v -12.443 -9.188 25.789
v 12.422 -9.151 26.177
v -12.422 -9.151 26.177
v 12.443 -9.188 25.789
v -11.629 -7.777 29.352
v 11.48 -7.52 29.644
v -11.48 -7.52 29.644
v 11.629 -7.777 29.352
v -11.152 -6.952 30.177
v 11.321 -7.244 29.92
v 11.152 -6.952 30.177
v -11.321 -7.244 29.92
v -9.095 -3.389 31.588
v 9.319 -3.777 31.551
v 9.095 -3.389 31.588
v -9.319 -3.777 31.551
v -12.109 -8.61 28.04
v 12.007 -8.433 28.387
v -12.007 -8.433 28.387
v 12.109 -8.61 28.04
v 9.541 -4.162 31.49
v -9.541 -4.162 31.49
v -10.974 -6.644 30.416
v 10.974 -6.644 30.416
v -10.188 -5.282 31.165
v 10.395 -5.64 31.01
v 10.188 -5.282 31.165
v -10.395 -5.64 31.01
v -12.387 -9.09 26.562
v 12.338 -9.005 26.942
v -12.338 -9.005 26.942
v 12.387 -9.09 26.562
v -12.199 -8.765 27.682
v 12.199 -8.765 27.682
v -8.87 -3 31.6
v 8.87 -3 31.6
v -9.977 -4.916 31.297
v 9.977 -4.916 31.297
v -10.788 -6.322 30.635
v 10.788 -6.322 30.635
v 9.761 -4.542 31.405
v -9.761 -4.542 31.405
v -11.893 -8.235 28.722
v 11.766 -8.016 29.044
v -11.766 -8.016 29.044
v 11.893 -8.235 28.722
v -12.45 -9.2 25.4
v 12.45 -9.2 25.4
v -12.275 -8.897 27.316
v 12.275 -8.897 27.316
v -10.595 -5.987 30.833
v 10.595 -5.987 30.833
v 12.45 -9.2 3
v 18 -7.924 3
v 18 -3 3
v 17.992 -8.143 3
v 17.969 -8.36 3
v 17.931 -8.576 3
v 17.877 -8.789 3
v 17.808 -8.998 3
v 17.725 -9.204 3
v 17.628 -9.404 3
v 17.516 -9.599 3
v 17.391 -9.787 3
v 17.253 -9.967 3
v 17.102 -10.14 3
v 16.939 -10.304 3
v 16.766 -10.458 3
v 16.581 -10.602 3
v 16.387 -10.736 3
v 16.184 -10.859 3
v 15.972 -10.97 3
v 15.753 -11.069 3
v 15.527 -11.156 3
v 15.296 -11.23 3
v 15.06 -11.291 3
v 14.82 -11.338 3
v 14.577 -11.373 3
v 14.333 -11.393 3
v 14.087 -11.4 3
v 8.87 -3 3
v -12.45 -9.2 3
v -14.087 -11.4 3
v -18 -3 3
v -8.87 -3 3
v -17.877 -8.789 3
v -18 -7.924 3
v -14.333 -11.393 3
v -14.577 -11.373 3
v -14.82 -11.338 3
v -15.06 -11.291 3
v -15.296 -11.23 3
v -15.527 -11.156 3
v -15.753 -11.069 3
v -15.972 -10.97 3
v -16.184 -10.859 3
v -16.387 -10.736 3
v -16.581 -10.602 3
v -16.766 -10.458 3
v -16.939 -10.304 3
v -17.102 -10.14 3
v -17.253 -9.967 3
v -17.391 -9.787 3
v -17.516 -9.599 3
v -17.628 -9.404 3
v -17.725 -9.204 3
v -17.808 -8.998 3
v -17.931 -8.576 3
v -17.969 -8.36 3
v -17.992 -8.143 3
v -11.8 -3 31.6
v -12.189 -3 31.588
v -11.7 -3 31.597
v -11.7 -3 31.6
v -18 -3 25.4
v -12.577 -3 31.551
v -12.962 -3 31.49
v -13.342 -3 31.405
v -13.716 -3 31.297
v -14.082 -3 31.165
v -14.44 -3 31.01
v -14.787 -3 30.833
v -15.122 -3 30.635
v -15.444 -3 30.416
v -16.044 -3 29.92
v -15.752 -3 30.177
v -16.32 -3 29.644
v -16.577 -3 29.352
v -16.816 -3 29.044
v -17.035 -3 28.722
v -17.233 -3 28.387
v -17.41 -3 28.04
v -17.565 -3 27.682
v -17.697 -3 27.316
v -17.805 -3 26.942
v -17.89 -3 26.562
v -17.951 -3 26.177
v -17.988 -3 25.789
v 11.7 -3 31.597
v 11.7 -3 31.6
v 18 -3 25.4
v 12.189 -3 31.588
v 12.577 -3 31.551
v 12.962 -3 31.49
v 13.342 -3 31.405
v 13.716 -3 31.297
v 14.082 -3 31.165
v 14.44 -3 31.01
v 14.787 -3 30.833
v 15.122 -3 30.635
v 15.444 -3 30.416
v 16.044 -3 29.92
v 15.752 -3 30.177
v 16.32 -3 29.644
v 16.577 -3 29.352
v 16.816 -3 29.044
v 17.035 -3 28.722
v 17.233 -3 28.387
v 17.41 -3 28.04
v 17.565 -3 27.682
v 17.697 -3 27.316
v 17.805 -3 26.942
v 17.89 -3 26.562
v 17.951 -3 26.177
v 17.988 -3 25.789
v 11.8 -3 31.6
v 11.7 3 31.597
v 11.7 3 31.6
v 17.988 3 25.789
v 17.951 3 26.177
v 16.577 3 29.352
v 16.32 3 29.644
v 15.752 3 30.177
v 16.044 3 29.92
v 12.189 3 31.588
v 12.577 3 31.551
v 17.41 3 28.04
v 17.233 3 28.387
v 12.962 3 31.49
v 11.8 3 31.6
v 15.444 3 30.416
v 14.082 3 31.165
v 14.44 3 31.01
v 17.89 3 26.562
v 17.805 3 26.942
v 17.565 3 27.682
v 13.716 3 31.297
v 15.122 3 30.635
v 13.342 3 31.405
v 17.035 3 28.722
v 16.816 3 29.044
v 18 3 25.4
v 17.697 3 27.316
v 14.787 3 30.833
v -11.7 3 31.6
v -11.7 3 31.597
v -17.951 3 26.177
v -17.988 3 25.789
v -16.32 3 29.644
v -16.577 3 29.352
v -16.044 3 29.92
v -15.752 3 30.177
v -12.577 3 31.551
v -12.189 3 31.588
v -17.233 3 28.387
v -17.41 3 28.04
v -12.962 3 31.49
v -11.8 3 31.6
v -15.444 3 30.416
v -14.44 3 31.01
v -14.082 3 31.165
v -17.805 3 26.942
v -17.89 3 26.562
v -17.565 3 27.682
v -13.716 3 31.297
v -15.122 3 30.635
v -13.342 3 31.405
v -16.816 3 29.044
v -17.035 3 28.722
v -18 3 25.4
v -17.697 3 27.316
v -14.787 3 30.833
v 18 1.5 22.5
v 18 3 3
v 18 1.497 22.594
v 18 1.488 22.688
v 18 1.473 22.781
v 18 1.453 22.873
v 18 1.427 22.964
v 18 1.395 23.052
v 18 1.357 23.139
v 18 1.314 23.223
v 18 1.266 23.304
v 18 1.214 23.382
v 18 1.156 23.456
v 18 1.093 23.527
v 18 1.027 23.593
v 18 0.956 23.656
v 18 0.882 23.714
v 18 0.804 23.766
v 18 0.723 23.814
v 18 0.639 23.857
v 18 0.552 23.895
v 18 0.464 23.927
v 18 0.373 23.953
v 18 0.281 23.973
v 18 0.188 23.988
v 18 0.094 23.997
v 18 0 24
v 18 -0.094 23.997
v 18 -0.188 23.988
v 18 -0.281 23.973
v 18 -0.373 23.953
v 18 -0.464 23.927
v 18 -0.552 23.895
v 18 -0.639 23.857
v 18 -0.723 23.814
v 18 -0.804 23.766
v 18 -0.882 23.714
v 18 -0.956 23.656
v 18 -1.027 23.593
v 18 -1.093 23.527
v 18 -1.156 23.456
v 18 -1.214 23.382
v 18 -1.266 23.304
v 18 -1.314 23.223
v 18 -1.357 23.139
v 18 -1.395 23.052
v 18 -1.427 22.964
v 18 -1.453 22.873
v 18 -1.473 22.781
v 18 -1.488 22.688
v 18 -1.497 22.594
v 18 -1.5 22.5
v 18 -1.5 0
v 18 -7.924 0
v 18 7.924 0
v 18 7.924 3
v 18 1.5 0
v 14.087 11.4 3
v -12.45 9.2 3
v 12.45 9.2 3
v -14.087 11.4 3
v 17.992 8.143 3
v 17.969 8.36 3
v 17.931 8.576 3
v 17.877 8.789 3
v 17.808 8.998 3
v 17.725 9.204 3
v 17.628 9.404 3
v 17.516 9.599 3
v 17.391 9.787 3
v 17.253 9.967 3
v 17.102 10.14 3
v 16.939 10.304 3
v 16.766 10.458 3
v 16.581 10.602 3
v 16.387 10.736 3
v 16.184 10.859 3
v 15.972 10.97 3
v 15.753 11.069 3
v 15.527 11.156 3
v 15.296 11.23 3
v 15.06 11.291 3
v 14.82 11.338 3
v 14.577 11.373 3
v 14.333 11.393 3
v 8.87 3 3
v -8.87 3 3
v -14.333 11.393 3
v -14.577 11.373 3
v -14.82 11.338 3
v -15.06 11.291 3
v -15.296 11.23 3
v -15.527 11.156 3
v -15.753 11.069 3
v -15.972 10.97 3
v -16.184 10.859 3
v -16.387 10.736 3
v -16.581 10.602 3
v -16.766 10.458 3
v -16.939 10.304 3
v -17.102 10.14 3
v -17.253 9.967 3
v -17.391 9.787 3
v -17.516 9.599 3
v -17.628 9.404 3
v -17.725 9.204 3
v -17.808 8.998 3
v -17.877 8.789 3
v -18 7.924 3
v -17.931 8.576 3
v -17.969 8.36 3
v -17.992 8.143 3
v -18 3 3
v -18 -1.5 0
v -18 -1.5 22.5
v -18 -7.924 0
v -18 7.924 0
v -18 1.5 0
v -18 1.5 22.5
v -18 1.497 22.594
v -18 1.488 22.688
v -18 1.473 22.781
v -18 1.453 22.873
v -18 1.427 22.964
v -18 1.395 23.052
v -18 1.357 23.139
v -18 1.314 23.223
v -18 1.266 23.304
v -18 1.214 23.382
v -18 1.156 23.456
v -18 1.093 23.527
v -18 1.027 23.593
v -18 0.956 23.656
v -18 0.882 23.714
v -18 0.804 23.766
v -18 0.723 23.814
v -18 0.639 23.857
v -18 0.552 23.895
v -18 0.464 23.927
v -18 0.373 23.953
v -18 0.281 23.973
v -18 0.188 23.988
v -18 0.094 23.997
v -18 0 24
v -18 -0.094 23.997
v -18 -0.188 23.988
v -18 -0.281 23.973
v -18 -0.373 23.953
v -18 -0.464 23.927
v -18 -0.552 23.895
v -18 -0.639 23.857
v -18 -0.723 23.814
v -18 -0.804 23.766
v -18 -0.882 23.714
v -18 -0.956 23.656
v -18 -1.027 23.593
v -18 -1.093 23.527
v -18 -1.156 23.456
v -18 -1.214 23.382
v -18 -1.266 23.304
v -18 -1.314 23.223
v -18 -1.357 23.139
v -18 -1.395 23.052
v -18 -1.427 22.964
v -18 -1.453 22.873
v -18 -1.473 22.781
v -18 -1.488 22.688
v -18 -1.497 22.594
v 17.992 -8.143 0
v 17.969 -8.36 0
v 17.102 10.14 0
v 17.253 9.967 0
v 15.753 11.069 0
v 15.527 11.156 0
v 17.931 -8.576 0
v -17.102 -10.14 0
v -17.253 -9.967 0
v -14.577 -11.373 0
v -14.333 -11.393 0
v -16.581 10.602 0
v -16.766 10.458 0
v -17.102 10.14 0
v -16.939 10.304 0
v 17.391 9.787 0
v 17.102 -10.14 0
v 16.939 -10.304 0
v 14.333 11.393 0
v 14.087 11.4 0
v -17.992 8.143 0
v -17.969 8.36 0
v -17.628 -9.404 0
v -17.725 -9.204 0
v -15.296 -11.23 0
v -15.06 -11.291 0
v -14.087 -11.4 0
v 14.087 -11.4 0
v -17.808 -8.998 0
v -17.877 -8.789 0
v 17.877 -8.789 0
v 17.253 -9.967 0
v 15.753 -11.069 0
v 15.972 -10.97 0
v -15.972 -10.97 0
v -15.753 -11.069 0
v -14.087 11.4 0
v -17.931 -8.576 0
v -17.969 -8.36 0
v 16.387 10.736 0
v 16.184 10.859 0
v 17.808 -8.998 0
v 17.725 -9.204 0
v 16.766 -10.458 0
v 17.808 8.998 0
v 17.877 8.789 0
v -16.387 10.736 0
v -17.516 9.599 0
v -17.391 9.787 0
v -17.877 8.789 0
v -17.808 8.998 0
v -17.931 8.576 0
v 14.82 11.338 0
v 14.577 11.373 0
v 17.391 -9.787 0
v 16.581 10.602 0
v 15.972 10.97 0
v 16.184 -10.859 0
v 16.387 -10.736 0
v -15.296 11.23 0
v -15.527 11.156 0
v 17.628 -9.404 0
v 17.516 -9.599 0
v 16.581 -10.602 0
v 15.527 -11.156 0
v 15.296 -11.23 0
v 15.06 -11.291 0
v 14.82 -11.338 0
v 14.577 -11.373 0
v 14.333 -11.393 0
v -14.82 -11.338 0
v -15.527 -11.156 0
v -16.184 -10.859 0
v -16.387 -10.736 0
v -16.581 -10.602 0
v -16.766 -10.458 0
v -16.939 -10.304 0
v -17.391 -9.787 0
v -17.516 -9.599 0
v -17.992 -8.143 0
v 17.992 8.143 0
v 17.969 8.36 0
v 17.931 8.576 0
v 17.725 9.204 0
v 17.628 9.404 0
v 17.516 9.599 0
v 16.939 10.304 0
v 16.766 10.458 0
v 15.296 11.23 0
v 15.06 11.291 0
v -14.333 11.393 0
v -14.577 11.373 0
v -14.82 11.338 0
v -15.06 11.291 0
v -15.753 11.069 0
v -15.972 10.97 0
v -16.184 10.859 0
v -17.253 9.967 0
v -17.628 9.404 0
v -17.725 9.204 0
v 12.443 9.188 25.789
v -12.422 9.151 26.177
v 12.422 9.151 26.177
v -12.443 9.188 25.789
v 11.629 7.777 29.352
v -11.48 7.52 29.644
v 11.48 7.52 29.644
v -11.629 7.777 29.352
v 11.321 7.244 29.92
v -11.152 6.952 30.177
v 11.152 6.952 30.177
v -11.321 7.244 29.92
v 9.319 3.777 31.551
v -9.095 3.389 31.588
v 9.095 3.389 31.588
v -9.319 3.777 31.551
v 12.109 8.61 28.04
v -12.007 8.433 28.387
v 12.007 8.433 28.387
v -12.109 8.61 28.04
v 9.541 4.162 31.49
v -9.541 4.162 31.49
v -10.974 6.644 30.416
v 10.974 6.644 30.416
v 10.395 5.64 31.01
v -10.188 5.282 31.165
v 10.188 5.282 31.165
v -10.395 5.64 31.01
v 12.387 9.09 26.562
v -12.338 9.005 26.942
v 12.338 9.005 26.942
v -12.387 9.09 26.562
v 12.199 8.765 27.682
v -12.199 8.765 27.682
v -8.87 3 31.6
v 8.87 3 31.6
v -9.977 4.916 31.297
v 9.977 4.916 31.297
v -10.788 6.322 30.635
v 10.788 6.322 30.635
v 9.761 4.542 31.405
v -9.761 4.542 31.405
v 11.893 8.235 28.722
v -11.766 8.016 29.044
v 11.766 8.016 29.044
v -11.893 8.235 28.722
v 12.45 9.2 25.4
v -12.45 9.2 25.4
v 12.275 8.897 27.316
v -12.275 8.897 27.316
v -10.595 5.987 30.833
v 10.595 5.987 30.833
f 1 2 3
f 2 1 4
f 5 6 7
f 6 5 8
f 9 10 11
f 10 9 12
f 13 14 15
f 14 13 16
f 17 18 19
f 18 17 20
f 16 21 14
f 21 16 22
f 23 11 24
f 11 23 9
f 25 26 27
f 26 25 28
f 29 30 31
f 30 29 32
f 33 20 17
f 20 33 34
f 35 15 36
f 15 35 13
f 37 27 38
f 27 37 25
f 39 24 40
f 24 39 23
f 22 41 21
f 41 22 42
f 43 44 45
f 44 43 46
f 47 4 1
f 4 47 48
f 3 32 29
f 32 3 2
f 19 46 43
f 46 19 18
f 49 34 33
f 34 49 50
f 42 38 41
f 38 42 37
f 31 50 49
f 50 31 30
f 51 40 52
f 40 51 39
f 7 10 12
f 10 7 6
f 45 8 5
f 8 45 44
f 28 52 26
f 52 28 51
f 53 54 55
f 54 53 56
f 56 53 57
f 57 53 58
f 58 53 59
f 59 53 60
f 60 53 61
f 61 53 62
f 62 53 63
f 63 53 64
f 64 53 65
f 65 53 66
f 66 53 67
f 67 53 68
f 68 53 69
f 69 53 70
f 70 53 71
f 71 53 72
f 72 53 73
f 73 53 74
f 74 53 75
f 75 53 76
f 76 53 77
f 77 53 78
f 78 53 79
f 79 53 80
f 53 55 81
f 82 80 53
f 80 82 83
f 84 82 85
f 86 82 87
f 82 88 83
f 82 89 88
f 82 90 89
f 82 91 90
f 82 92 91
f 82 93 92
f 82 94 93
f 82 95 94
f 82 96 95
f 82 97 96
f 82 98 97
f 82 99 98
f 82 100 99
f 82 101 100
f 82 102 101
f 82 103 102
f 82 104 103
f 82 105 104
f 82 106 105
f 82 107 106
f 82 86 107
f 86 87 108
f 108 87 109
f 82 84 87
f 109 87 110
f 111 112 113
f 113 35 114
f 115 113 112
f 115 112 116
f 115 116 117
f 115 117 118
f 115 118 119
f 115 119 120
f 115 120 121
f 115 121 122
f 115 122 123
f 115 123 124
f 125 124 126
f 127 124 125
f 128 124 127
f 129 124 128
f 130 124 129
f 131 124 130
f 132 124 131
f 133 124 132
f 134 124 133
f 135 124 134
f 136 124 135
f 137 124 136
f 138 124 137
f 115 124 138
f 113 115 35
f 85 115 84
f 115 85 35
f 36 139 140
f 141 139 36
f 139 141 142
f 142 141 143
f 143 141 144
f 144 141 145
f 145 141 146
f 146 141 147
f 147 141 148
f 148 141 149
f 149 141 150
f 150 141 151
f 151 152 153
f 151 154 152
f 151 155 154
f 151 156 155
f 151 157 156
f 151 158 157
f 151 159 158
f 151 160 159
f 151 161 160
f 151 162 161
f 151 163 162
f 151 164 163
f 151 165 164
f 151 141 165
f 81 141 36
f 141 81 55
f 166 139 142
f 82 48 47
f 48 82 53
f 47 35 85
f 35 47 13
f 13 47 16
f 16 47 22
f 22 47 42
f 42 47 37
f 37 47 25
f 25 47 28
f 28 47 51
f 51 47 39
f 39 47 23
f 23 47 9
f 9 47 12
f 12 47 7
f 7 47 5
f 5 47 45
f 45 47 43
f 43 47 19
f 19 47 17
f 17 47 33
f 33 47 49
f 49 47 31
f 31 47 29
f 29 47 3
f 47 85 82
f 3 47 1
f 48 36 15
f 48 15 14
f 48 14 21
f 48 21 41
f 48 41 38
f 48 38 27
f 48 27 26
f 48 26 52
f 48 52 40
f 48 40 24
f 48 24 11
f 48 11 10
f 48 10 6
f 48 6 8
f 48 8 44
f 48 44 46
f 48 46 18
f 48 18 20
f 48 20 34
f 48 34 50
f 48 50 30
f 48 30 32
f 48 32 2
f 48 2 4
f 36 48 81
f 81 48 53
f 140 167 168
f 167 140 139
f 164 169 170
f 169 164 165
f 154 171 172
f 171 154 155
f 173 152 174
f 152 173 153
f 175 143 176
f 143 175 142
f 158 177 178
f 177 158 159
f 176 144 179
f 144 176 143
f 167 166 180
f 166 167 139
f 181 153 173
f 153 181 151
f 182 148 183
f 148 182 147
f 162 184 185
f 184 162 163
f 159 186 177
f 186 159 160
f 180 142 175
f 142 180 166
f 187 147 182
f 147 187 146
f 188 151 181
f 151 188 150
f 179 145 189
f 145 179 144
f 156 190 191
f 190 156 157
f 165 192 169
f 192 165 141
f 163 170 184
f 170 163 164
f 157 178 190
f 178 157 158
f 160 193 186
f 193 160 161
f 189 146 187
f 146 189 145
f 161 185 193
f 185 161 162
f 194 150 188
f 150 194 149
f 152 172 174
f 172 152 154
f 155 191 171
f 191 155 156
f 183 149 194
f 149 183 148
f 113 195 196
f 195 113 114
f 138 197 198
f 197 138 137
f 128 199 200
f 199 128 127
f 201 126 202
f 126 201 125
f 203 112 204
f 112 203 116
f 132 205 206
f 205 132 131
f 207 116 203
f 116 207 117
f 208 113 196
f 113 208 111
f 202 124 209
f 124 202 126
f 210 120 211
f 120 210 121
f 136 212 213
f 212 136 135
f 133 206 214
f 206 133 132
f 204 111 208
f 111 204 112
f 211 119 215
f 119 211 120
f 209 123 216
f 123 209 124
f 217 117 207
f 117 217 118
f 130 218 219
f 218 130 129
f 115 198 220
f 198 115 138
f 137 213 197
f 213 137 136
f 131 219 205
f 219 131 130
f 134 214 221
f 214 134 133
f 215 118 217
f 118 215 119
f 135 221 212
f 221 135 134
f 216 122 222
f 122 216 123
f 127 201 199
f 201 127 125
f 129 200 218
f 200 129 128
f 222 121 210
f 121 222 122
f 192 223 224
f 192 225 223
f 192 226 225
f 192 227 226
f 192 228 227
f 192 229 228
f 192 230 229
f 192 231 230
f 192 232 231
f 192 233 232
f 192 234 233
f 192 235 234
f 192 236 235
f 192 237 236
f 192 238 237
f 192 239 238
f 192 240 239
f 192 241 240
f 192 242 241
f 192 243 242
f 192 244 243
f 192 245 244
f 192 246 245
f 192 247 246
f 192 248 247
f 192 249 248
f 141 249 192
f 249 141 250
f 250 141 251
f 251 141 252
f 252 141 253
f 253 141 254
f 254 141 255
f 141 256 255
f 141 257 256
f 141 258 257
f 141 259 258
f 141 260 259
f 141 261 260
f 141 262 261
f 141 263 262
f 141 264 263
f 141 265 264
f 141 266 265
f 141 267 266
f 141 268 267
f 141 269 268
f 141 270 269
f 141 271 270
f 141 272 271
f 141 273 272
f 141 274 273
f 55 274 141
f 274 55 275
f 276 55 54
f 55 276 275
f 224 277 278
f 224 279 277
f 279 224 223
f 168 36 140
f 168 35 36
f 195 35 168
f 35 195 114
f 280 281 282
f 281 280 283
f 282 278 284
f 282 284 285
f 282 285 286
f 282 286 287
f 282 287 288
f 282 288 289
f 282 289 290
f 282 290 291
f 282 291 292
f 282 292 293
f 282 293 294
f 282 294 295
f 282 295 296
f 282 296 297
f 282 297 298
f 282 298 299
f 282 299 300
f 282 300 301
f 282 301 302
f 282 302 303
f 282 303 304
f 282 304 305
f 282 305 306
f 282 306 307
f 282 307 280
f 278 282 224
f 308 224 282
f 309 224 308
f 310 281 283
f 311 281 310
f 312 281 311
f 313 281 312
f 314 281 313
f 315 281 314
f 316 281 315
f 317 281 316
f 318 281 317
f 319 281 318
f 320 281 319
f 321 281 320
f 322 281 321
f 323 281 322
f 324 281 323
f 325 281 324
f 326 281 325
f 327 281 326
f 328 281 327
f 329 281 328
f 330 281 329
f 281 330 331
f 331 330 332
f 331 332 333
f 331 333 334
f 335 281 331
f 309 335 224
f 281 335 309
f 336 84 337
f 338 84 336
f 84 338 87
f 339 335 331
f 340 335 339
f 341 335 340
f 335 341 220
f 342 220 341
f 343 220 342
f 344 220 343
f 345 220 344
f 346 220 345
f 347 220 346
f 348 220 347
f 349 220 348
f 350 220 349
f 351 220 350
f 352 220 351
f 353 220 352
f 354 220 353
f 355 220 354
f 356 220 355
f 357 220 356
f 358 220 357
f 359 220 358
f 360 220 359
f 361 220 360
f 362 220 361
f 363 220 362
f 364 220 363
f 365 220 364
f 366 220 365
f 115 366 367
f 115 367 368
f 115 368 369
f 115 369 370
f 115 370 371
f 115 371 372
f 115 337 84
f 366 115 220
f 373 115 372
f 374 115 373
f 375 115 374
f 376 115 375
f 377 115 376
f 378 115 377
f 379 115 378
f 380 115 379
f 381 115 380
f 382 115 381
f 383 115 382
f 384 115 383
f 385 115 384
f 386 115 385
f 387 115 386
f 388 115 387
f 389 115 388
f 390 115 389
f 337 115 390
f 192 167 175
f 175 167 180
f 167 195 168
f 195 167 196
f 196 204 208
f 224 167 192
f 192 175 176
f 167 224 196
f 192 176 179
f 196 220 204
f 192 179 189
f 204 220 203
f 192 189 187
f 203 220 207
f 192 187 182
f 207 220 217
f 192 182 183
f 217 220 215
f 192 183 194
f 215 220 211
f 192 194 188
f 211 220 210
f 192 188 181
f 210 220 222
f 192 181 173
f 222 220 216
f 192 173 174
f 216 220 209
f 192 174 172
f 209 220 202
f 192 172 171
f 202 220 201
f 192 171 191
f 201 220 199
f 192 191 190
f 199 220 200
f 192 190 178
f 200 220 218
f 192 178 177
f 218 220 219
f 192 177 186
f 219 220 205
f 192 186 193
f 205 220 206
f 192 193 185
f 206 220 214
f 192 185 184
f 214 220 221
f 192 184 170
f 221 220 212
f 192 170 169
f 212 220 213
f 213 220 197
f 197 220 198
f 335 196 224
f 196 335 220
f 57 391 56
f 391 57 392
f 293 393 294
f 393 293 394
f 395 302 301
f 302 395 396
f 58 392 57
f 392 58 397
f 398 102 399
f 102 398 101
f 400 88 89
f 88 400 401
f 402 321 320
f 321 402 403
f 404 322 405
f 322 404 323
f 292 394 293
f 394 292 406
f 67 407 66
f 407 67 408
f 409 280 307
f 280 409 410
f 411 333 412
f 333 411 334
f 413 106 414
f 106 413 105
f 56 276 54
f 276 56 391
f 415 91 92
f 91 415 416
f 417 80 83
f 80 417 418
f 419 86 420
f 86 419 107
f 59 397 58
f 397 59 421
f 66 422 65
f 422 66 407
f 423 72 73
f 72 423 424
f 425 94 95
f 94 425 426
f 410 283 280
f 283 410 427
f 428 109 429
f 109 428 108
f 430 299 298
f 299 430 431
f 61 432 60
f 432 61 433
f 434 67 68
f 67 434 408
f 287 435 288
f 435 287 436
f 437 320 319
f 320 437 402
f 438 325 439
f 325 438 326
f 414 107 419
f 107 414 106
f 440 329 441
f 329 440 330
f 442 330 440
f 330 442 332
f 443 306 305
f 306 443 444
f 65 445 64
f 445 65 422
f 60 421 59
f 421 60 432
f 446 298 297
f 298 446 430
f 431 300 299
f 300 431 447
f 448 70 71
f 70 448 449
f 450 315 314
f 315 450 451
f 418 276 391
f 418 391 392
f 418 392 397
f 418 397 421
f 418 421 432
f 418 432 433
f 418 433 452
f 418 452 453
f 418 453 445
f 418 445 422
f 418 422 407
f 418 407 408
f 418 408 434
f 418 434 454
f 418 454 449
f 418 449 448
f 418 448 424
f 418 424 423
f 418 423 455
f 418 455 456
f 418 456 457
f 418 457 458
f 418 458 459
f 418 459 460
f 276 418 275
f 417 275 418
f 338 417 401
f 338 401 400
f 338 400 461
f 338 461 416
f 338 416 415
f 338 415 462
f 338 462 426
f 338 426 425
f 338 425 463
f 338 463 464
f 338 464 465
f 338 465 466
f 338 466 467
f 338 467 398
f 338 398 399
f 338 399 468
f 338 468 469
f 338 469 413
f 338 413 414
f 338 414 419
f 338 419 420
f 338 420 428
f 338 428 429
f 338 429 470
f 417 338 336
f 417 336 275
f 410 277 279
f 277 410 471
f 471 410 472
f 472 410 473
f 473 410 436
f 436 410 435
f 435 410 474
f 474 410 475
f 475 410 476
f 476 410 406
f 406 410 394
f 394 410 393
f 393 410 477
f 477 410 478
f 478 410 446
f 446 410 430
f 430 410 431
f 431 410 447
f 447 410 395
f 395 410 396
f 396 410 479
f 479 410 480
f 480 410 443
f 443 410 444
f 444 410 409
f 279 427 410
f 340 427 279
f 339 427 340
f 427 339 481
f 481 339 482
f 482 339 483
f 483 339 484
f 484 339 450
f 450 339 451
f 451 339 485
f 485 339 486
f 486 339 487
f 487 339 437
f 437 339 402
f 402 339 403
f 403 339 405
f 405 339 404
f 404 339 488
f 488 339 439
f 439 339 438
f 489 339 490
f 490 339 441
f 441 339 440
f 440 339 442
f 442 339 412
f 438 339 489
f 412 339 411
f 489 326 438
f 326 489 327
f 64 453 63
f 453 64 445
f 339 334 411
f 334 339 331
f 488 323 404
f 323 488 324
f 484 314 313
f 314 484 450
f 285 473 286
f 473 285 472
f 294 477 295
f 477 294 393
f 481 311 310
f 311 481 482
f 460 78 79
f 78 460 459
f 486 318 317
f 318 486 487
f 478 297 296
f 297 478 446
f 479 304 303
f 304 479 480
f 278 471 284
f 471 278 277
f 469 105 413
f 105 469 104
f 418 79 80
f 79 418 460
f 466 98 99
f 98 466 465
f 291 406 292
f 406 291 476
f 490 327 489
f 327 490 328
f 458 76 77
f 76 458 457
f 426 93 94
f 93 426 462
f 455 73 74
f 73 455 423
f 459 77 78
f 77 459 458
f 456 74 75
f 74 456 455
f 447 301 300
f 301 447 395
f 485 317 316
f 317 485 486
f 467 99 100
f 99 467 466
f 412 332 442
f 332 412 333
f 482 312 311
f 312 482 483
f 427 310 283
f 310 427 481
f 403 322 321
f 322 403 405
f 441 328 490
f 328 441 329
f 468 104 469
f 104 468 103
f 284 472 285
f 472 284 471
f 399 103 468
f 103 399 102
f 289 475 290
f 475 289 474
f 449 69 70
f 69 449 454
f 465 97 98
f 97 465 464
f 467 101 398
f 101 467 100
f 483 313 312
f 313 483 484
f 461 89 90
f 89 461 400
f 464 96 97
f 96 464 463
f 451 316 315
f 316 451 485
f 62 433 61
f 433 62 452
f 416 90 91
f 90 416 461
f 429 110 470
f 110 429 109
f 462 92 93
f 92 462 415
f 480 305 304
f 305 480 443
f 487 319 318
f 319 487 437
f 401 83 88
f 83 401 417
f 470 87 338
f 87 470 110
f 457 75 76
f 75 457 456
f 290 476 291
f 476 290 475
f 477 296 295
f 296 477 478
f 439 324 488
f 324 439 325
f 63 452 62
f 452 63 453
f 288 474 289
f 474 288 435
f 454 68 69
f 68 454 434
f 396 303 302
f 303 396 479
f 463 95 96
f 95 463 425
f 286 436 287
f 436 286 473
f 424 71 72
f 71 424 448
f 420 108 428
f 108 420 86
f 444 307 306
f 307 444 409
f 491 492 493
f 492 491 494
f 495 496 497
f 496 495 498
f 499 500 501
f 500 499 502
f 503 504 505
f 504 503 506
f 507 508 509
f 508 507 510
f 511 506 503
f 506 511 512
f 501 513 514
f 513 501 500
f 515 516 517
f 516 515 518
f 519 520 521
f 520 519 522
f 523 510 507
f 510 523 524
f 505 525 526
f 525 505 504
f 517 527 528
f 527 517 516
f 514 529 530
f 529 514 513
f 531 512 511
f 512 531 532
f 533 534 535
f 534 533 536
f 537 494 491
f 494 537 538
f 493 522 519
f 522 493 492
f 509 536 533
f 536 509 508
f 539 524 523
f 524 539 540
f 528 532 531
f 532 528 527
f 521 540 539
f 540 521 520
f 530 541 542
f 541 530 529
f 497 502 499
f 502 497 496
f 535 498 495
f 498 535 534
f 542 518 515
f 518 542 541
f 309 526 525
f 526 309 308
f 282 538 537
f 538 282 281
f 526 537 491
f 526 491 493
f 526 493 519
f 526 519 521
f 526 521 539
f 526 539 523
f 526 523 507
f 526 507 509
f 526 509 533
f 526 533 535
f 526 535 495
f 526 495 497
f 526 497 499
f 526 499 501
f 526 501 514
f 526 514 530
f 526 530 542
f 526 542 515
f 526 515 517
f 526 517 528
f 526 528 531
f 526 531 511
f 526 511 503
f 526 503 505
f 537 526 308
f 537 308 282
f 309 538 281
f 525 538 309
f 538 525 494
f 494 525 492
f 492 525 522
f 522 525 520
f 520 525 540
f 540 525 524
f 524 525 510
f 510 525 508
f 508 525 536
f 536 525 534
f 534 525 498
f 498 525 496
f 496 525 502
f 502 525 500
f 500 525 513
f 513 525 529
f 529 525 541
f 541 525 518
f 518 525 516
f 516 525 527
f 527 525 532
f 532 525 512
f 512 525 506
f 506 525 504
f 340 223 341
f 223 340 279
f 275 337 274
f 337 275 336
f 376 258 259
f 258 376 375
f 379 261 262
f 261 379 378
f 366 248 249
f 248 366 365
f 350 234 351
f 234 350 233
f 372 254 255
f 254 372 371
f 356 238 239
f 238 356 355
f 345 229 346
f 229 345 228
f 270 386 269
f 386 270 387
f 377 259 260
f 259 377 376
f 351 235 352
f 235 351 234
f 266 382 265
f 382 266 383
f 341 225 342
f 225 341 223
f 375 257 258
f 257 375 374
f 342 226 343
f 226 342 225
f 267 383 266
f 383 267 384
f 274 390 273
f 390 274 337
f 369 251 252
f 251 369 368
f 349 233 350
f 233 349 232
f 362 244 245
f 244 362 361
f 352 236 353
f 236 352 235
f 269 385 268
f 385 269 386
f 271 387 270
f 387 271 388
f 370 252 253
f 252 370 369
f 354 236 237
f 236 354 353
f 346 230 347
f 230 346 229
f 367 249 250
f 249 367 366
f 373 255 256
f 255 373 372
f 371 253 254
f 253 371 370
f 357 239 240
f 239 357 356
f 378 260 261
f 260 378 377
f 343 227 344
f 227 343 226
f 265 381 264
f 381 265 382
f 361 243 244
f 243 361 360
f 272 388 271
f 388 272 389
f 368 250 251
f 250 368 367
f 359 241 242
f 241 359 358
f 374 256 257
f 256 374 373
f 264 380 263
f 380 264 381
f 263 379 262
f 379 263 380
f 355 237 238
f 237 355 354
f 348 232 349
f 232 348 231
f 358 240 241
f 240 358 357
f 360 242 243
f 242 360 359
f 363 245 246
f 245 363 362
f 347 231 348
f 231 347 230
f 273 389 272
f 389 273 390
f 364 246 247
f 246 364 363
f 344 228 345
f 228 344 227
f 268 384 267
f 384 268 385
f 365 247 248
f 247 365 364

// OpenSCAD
//[mm]
gapSize = 3;

module wedge()
{
    difference(){
        cube([24.9,6.2,28.6]);
        translate([0,0,-0.1])rotate(60)cube([10,10,30]);
        translate([24.9,0,-0.1])rotate(30,[0,0,1])cube([10,10,30]);
        roundEdge();
    }
}

module base()
{
    $fn=100;
    translate([0,9.2,0])linear_extrude(3,true)resize([36,22.8])offset(r=5)square([36,22.8],true);  
    difference()
    {   
        translate([-18,6.2,3])cube([36,6,28.6]);
        translate([18,0,3])
        rotate(90)
        roundEdge();
        translate([-18,20,3])
        rotate(-90)
        roundEdge();
    }
}

module roundEdge()
{
    difference()   
    {
        translate([0,-0.2,22.4])cube([30,6.5,6.5]);
        $fn=100;
        translate([-1,6.2,22.4])rotate(90,[0,1,0])cylinder(35,6.2,6.2);
    }
}

module holder()
{
    translate([-12.45,-9.2,3])wedge();
    translate([0,-9.2,0])base();
    translate([12.45,9.2,3])rotate(180)wedge();
}

module gap()
{
    translate([0,-gapSize/2,-0.2])cube([40,gapSize,24.2-gapSize/2]);
    $fn=100;
    translate([0,0,24-gapSize/2])rotate(90,[0,1,0])cylinder(40,gapSize/2,gapSize/2);
}



difference()
{
    holder();
    translate([-20,0,0])gap();
}
